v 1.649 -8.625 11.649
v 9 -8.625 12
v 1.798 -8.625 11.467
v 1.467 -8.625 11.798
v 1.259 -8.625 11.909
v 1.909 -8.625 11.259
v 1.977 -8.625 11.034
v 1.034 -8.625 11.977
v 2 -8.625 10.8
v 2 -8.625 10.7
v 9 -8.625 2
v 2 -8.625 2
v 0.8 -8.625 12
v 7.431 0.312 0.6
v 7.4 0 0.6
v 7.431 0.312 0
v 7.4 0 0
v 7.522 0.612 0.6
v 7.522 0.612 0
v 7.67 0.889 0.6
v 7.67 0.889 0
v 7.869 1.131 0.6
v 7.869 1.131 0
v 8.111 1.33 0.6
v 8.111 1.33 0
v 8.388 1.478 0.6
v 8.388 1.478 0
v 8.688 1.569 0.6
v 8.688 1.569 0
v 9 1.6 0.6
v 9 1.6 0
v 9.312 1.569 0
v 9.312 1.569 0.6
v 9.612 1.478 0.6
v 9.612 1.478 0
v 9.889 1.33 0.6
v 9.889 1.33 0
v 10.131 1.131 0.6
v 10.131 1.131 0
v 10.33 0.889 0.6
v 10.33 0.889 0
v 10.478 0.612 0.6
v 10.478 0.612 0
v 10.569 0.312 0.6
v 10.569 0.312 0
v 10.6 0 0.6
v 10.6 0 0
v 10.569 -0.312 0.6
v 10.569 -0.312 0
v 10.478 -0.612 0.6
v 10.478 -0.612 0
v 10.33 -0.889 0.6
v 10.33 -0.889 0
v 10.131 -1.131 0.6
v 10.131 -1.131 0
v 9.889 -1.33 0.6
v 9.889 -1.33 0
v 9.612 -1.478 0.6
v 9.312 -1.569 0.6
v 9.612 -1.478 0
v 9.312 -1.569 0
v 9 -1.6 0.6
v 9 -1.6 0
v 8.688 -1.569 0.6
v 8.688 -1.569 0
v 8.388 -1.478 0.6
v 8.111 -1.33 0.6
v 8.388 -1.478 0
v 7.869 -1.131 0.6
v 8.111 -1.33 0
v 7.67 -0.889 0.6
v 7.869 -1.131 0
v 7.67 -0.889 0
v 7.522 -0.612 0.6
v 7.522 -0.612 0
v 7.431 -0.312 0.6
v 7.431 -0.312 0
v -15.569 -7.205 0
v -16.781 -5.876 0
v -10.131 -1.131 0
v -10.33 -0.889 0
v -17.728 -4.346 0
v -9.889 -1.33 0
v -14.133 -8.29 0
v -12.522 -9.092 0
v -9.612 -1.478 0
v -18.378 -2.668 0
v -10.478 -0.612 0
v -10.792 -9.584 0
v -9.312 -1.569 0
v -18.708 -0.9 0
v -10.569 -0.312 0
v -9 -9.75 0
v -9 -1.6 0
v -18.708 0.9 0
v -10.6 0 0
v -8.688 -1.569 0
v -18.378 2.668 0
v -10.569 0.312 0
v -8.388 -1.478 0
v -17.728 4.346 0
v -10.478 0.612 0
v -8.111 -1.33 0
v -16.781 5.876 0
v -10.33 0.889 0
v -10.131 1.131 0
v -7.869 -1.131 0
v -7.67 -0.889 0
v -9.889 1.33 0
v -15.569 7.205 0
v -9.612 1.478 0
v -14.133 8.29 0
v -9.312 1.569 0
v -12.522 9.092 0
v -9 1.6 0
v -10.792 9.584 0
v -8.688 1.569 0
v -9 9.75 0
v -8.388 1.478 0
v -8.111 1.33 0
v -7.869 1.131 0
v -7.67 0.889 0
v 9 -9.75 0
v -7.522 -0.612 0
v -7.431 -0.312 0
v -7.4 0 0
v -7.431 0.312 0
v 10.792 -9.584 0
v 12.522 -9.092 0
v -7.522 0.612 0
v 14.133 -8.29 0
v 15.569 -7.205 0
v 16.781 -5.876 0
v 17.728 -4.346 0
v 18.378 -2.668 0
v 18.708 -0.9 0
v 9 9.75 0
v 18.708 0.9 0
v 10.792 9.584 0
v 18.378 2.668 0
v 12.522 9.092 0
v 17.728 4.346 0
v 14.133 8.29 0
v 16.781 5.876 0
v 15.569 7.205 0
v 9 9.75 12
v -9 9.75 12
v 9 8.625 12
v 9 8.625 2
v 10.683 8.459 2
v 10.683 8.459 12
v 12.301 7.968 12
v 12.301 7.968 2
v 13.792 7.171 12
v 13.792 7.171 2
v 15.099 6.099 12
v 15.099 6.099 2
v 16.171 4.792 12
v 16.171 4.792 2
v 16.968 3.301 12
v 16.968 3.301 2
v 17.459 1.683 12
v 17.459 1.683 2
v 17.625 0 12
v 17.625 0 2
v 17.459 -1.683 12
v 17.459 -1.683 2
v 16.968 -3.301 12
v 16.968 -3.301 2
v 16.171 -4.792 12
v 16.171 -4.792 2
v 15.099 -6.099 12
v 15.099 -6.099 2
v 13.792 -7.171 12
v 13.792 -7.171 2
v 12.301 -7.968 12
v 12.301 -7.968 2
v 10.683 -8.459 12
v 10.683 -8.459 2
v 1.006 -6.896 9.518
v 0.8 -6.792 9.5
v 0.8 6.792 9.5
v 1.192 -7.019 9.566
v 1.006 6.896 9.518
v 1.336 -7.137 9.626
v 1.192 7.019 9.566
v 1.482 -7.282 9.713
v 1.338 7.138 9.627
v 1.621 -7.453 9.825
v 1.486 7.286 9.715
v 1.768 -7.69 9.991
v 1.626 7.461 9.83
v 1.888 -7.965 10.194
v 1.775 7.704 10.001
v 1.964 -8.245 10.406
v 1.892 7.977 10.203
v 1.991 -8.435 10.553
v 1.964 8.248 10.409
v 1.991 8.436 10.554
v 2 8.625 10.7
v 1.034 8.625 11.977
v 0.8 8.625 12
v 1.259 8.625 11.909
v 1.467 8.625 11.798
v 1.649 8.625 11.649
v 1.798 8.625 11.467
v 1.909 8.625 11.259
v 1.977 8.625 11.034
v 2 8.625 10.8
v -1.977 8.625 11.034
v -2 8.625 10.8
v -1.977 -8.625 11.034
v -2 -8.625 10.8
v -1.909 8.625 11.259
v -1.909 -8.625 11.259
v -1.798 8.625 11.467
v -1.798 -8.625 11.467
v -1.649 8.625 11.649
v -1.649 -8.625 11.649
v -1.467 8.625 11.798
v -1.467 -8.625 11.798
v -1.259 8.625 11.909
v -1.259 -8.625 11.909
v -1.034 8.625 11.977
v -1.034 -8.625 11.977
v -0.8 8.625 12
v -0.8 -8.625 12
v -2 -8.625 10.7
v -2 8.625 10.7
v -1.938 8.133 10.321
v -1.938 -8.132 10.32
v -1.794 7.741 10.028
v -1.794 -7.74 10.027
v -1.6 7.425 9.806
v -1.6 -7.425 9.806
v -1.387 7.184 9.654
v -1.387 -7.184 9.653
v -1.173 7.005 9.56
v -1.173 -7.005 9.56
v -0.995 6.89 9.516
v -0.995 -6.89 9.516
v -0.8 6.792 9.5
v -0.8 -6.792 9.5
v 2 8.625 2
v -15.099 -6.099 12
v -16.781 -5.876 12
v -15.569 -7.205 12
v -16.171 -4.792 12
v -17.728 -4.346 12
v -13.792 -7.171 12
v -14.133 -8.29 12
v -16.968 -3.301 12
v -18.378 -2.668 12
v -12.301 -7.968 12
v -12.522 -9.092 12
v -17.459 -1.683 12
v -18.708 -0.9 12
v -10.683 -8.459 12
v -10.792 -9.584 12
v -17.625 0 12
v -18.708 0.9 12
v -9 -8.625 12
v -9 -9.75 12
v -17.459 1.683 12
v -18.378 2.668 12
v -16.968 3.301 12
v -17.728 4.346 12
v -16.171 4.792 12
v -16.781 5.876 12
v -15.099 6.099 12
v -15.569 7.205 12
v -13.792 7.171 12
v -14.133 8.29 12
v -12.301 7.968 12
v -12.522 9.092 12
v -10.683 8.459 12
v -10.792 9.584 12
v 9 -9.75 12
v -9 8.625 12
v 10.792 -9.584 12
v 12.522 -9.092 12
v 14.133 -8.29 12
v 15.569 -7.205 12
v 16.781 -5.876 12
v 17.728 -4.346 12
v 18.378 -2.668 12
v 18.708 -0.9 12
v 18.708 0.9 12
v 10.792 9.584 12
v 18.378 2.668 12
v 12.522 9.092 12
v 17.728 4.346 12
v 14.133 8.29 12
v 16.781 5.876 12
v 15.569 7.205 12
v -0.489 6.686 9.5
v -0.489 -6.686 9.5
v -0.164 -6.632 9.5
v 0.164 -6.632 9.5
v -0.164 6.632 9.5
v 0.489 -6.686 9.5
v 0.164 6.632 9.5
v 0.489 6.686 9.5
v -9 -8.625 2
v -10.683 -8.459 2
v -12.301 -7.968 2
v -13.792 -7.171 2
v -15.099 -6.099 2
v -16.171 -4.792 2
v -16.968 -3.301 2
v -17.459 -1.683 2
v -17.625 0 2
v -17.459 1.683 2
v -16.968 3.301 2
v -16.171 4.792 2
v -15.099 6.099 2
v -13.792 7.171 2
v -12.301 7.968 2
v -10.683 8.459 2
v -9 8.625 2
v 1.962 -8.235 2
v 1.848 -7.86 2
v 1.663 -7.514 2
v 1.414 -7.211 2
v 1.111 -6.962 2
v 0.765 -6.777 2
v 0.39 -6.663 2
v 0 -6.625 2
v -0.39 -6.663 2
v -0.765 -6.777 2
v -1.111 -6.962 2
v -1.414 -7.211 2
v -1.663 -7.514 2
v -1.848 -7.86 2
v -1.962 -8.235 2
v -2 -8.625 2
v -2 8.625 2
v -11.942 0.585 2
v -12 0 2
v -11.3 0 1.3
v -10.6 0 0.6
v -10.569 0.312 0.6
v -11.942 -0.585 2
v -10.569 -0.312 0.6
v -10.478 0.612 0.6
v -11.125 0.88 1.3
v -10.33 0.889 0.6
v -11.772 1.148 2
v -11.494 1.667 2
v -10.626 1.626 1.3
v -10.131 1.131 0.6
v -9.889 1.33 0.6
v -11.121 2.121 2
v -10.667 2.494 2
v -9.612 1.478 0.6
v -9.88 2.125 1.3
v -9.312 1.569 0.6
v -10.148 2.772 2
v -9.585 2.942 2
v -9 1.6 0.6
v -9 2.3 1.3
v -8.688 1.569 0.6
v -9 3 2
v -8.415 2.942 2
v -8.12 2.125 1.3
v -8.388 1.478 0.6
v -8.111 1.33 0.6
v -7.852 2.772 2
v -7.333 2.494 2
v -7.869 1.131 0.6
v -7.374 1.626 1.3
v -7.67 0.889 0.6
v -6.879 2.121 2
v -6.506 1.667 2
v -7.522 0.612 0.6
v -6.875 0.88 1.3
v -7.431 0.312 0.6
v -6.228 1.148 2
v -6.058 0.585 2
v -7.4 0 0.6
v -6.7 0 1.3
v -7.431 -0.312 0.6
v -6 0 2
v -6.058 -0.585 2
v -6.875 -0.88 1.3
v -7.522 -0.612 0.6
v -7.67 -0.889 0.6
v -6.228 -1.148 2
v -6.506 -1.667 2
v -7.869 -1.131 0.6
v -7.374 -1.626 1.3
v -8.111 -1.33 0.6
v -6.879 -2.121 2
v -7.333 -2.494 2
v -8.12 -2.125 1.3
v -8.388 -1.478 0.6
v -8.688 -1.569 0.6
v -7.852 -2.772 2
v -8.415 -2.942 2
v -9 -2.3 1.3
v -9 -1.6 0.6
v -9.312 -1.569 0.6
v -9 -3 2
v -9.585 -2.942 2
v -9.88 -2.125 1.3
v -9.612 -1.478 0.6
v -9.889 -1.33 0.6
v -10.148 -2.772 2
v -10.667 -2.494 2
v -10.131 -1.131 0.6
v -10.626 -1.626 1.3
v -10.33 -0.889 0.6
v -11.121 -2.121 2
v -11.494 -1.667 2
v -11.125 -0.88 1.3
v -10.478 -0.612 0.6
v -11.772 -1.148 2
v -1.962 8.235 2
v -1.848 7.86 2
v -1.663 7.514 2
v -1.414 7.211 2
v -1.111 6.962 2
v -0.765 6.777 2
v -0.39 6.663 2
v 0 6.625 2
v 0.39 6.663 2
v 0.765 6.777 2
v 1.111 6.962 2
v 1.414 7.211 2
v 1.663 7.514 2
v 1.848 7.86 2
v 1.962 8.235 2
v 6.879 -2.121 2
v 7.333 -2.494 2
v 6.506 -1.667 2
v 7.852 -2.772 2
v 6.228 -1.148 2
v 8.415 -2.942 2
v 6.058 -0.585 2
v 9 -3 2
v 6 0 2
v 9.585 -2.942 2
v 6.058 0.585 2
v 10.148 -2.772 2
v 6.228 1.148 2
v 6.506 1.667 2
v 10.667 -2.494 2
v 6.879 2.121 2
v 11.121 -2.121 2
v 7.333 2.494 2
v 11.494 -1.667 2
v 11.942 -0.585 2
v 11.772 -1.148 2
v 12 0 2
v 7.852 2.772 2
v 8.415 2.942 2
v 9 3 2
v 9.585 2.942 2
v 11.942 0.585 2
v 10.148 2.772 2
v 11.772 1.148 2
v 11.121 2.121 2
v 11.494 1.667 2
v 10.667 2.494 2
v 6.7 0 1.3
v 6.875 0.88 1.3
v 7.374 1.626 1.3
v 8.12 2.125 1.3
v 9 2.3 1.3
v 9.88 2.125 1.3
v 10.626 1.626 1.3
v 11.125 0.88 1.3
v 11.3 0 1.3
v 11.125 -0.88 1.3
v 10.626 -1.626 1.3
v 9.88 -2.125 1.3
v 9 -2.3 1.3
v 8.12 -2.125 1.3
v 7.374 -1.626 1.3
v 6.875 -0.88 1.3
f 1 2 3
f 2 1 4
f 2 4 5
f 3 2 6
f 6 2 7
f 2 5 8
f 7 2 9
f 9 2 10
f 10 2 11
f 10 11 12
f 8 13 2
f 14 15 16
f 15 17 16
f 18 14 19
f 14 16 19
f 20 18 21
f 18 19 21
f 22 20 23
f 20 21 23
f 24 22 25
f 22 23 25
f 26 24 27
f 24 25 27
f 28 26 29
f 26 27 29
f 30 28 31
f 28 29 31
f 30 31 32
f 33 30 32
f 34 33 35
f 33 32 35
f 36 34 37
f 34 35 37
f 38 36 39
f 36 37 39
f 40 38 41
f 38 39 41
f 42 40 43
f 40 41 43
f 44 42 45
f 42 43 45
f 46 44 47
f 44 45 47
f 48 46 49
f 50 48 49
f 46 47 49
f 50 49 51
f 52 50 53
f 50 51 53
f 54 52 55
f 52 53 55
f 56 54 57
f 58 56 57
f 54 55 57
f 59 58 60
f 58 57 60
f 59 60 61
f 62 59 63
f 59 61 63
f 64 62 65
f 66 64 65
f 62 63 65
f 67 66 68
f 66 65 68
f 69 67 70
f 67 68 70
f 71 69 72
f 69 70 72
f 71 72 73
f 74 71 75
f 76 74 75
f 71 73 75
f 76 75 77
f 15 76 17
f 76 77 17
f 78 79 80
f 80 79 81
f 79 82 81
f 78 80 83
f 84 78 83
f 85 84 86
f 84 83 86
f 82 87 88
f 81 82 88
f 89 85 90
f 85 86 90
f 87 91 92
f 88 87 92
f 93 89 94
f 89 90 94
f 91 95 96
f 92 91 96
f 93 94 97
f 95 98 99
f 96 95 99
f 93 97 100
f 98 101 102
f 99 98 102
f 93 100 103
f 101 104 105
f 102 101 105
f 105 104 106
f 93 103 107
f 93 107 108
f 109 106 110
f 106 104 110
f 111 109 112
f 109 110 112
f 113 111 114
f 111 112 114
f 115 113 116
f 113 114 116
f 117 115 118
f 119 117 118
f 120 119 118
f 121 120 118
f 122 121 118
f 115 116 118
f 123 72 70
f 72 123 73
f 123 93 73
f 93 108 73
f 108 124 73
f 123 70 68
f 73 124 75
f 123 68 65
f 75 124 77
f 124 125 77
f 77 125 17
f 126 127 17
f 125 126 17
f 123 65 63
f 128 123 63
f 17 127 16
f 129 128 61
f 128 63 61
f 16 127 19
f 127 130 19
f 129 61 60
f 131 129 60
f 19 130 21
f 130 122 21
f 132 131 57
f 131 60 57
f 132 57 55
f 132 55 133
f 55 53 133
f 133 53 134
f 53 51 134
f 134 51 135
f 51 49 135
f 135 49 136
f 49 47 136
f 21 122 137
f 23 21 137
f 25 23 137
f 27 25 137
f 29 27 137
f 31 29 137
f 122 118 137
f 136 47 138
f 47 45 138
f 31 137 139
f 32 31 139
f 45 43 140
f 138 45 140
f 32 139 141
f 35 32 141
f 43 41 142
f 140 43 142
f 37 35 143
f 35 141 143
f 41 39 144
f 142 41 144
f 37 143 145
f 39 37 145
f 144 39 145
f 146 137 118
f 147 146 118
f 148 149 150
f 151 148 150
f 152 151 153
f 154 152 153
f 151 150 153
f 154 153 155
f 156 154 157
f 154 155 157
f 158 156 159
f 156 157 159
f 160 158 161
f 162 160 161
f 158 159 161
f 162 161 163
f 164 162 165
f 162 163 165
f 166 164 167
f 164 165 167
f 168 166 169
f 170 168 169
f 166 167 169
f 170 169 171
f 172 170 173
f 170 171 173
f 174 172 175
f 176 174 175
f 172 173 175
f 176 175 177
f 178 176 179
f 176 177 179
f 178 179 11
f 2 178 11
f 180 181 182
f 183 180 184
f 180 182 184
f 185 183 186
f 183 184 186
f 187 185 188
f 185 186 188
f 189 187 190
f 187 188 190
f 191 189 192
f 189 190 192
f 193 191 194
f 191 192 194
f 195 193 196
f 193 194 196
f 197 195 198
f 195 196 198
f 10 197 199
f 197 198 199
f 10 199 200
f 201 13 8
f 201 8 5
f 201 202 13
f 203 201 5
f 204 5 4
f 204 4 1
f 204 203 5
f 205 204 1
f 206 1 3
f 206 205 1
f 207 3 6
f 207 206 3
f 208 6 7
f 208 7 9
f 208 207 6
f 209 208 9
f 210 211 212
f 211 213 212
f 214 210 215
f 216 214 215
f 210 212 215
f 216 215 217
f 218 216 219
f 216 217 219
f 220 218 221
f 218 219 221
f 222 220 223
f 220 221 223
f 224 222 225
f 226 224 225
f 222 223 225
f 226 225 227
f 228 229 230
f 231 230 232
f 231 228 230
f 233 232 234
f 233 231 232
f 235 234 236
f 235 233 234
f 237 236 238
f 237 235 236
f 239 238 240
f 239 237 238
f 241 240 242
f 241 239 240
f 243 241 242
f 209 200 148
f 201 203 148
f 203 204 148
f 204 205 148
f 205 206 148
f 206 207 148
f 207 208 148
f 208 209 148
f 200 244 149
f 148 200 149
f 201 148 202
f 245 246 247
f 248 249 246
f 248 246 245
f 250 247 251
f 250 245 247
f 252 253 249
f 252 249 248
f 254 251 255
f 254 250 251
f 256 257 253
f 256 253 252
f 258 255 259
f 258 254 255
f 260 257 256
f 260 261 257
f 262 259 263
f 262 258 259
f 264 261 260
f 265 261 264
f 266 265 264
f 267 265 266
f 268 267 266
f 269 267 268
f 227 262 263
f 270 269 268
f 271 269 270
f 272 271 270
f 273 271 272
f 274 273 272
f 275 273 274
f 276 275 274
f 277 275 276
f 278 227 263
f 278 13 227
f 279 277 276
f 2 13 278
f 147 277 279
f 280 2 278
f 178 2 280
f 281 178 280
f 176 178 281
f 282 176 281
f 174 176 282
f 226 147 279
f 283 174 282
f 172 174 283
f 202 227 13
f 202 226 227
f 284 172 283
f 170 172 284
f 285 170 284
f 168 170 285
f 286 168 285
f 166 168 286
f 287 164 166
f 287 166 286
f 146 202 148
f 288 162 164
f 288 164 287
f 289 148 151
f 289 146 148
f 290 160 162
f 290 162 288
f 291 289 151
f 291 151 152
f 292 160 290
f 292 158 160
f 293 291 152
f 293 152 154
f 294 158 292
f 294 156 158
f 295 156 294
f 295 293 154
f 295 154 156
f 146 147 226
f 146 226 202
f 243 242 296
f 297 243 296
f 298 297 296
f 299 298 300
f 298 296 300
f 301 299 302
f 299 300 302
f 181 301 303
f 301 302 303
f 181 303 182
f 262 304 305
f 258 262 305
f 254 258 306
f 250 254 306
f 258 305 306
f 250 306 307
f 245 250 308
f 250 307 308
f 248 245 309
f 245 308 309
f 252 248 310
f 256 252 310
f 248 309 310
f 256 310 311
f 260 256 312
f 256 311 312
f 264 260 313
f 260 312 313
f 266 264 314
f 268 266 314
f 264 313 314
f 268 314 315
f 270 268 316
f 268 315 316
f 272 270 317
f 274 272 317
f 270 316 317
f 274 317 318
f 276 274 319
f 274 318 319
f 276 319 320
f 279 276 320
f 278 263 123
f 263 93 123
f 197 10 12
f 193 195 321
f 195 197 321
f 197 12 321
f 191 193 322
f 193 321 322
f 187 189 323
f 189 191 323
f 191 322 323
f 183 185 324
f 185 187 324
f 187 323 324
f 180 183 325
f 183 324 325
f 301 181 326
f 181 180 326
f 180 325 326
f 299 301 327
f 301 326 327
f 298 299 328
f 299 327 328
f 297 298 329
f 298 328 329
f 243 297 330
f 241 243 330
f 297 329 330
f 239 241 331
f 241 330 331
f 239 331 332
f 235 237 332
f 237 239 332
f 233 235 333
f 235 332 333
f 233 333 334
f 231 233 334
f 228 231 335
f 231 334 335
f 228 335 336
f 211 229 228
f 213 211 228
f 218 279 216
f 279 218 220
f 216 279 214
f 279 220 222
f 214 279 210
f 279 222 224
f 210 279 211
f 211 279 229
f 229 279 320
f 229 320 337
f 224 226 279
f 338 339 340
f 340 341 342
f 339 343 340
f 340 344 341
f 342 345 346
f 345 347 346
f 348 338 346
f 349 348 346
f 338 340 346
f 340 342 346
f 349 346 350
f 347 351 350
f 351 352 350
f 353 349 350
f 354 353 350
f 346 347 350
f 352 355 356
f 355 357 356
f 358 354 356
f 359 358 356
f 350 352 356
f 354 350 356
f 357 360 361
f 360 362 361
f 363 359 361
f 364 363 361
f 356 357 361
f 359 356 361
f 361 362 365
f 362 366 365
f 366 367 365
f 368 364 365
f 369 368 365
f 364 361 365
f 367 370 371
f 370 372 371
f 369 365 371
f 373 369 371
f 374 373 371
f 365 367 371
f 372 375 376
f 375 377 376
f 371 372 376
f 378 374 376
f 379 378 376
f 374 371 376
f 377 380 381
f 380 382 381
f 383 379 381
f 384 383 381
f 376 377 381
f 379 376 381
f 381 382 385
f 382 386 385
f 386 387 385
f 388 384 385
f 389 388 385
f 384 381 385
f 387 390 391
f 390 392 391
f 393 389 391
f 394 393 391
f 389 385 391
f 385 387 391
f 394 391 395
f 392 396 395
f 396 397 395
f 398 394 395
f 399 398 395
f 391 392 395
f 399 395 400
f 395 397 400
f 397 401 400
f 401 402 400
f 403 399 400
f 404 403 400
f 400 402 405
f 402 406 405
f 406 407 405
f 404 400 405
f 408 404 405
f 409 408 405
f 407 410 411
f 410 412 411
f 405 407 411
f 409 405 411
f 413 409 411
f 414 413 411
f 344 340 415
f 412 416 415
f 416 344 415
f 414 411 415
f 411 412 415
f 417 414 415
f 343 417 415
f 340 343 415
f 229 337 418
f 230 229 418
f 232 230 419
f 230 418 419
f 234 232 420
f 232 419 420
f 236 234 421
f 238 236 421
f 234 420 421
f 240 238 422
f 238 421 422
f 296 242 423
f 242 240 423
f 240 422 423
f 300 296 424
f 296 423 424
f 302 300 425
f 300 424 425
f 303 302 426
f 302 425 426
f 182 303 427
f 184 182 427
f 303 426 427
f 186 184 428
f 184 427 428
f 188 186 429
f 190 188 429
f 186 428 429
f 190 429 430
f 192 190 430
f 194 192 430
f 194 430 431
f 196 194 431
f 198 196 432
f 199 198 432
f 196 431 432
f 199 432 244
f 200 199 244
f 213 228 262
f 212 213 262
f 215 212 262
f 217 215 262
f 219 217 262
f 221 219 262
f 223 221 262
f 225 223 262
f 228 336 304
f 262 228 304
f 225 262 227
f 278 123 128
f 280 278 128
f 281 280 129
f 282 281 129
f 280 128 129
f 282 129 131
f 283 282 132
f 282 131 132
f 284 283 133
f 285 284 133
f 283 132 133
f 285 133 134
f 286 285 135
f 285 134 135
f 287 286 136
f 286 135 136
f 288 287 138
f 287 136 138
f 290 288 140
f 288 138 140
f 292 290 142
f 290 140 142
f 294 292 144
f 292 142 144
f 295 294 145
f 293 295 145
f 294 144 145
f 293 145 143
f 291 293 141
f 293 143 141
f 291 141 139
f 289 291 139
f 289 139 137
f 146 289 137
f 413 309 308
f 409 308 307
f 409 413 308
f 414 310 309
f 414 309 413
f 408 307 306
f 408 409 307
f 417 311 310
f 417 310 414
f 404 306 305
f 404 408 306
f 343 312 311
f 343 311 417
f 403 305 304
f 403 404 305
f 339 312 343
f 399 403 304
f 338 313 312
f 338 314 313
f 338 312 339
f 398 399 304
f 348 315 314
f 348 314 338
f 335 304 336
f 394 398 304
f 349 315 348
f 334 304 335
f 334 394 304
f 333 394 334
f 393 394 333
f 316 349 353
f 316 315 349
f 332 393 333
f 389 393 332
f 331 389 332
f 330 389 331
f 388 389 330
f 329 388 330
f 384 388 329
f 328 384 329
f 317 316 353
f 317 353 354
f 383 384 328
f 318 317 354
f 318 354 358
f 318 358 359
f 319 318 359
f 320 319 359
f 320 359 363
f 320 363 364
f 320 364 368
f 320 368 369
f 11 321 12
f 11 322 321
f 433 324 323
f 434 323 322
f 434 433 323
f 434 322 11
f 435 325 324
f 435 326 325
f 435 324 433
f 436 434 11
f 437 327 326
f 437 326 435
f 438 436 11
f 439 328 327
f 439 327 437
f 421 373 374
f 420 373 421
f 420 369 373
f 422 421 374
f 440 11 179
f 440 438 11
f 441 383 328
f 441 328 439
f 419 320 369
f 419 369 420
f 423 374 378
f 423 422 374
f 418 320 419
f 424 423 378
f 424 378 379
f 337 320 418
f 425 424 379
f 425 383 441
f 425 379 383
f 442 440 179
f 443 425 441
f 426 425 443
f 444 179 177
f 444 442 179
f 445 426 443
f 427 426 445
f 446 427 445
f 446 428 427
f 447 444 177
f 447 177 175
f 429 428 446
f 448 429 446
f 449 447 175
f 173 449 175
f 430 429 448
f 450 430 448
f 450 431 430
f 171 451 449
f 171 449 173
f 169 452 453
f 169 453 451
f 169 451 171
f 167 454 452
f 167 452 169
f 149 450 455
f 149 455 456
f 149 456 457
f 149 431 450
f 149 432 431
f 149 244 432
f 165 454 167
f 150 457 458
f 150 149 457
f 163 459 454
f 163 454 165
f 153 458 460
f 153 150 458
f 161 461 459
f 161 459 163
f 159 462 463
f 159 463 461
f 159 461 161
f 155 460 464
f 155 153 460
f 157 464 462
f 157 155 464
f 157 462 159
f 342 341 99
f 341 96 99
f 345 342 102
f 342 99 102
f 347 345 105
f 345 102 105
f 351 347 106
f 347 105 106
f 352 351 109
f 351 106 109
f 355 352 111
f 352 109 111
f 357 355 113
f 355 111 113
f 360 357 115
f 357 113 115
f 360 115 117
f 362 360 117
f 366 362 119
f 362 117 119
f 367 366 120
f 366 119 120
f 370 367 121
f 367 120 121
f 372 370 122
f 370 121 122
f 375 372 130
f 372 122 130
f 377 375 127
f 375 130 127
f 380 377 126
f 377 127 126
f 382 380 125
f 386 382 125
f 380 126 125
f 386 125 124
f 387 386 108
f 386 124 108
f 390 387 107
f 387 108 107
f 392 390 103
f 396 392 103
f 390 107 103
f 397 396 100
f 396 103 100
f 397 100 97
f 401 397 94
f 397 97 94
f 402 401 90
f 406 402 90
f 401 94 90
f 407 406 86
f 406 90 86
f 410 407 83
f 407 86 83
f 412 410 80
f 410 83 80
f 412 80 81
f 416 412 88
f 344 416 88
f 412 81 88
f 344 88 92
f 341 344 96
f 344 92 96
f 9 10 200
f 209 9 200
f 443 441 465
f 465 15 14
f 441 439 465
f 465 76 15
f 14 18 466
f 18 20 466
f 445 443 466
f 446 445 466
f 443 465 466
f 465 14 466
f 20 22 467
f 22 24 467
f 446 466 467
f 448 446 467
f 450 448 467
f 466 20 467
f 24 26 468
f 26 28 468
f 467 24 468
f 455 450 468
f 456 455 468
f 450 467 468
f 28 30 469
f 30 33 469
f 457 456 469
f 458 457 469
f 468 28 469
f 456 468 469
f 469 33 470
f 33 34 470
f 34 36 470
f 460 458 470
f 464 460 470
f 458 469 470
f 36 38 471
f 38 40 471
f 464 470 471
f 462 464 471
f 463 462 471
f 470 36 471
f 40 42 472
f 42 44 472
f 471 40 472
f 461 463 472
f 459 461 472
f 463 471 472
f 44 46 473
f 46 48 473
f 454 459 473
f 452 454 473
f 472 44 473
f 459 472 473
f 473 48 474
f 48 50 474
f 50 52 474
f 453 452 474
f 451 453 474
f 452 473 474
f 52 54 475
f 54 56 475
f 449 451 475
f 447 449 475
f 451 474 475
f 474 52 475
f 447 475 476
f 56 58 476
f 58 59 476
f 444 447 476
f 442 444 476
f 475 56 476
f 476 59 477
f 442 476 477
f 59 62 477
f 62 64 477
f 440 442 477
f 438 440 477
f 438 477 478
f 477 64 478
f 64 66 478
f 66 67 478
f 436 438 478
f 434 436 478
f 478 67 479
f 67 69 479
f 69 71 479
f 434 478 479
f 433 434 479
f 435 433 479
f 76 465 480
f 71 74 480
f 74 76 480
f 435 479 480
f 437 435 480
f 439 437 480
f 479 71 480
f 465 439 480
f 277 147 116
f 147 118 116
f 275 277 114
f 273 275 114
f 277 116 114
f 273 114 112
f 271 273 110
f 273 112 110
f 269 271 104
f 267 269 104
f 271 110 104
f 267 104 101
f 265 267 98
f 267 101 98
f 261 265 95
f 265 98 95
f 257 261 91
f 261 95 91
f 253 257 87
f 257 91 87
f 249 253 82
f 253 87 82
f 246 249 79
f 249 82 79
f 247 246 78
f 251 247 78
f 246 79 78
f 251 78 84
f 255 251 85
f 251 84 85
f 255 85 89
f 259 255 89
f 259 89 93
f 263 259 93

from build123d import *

# Parameters (mm, degrees)
F1_DEPTH        = 2
F3_DEPTH        = 10
F5_DEPTH        = 10
F8_DEPTH        = 2.5
F9_R            = 1.2
F11_D           = 3.2
F11_DEPTH       = 4.5
F11_CSINK_D     = 6
F11_CSINK_ANGLE = 90
F11_TIP         = 0.9613769904


with BuildPart() as f1:
    # F0 (on Top) → F1 (new body)
    with BuildSketch(Plane.XY):
        with BuildLine():
            Line((9, 9.75), (-9, 9.75))
            ThreePointArc((-9, 9.75), (-18.75, 0), (-9, -9.75))
            Line((-9, -9.75), (9, -9.75))
            ThreePointArc((9, -9.75), (18.75, 0), (9, 9.75))
        make_face()
    extrude(amount=F1_DEPTH)

    # F2 (on face) → F3 (join)
    with BuildSketch(Plane.XY.offset(2)):
        with BuildLine():
            Line((9, 9.75), (-9, 9.75))
            ThreePointArc((-9, 9.75), (-18.75, 0), (-9, -9.75))
            Line((-9, -9.75), (9, -9.75))
            ThreePointArc((9, -9.75), (18.75, 0), (9, 9.75))
        make_face()
        with BuildLine():
            ThreePointArc((9, 8.625), (17.625, 0), (9, -8.625))
            Line((9, -8.625), (-9, -8.625))
            ThreePointArc((-9, -8.625), (-17.625, 0), (-9, 8.625))
            Line((-9, 8.625), (9, 8.625))
        make_face(mode=Mode.SUBTRACT)
    extrude(amount=F3_DEPTH)

    # F4 (on face) → F5 (join)
    with BuildSketch(Plane.XY.offset(2)):
        with BuildLine():
            Line((2, 8.625), (-2, 8.625))
            ThreePointArc((-2, 8.625), (0, 6.625), (2, 8.625))
        make_face()
        with BuildLine():
            Line((-2, -8.625), (2, -8.625))
            ThreePointArc((2, -8.625), (0, -6.625), (-2, -8.625))
        make_face()
    extrude(amount=F5_DEPTH)

    # F7 (on offset) → F8 (join)
    with BuildSketch(Plane.XY.offset(9.5)):
        with BuildLine():
            ThreePointArc((2, 8.625), (0, 6.625), (-2, 8.625))
            Line((-2, 8.625), (-2, -8.625))
            ThreePointArc((-2, -8.625), (0, -6.625), (2, -8.625))
            Line((2, -8.625), (2, 8.625))
        make_face()
    extrude(amount=F8_DEPTH)

    # F9
    f9_edges = [f1.edges().sort_by_distance(p)[0] for p in [
        (2, 0, 12),
        (-2, 0, 12),
        (-2, 0, 9.5),
        (2, 0, 9.5),
    ]]
    fillet(f9_edges, radius=F9_R)

    # F11
    with Locations(Plane.XY.offset(2)):
        with Locations((-9, 0), (9, 0)):
            CounterSinkHole(F11_D / 2, F11_CSINK_D / 2, depth=F11_DEPTH, counter_sink_angle=F11_CSINK_ANGLE)
            with Locations((0, 0, -(F11_DEPTH + F11_TIP / 2))):  # 118° drill point
                Cone(0, F11_D / 2, F11_TIP, mode=Mode.SUBTRACT)


solid = f1.part
